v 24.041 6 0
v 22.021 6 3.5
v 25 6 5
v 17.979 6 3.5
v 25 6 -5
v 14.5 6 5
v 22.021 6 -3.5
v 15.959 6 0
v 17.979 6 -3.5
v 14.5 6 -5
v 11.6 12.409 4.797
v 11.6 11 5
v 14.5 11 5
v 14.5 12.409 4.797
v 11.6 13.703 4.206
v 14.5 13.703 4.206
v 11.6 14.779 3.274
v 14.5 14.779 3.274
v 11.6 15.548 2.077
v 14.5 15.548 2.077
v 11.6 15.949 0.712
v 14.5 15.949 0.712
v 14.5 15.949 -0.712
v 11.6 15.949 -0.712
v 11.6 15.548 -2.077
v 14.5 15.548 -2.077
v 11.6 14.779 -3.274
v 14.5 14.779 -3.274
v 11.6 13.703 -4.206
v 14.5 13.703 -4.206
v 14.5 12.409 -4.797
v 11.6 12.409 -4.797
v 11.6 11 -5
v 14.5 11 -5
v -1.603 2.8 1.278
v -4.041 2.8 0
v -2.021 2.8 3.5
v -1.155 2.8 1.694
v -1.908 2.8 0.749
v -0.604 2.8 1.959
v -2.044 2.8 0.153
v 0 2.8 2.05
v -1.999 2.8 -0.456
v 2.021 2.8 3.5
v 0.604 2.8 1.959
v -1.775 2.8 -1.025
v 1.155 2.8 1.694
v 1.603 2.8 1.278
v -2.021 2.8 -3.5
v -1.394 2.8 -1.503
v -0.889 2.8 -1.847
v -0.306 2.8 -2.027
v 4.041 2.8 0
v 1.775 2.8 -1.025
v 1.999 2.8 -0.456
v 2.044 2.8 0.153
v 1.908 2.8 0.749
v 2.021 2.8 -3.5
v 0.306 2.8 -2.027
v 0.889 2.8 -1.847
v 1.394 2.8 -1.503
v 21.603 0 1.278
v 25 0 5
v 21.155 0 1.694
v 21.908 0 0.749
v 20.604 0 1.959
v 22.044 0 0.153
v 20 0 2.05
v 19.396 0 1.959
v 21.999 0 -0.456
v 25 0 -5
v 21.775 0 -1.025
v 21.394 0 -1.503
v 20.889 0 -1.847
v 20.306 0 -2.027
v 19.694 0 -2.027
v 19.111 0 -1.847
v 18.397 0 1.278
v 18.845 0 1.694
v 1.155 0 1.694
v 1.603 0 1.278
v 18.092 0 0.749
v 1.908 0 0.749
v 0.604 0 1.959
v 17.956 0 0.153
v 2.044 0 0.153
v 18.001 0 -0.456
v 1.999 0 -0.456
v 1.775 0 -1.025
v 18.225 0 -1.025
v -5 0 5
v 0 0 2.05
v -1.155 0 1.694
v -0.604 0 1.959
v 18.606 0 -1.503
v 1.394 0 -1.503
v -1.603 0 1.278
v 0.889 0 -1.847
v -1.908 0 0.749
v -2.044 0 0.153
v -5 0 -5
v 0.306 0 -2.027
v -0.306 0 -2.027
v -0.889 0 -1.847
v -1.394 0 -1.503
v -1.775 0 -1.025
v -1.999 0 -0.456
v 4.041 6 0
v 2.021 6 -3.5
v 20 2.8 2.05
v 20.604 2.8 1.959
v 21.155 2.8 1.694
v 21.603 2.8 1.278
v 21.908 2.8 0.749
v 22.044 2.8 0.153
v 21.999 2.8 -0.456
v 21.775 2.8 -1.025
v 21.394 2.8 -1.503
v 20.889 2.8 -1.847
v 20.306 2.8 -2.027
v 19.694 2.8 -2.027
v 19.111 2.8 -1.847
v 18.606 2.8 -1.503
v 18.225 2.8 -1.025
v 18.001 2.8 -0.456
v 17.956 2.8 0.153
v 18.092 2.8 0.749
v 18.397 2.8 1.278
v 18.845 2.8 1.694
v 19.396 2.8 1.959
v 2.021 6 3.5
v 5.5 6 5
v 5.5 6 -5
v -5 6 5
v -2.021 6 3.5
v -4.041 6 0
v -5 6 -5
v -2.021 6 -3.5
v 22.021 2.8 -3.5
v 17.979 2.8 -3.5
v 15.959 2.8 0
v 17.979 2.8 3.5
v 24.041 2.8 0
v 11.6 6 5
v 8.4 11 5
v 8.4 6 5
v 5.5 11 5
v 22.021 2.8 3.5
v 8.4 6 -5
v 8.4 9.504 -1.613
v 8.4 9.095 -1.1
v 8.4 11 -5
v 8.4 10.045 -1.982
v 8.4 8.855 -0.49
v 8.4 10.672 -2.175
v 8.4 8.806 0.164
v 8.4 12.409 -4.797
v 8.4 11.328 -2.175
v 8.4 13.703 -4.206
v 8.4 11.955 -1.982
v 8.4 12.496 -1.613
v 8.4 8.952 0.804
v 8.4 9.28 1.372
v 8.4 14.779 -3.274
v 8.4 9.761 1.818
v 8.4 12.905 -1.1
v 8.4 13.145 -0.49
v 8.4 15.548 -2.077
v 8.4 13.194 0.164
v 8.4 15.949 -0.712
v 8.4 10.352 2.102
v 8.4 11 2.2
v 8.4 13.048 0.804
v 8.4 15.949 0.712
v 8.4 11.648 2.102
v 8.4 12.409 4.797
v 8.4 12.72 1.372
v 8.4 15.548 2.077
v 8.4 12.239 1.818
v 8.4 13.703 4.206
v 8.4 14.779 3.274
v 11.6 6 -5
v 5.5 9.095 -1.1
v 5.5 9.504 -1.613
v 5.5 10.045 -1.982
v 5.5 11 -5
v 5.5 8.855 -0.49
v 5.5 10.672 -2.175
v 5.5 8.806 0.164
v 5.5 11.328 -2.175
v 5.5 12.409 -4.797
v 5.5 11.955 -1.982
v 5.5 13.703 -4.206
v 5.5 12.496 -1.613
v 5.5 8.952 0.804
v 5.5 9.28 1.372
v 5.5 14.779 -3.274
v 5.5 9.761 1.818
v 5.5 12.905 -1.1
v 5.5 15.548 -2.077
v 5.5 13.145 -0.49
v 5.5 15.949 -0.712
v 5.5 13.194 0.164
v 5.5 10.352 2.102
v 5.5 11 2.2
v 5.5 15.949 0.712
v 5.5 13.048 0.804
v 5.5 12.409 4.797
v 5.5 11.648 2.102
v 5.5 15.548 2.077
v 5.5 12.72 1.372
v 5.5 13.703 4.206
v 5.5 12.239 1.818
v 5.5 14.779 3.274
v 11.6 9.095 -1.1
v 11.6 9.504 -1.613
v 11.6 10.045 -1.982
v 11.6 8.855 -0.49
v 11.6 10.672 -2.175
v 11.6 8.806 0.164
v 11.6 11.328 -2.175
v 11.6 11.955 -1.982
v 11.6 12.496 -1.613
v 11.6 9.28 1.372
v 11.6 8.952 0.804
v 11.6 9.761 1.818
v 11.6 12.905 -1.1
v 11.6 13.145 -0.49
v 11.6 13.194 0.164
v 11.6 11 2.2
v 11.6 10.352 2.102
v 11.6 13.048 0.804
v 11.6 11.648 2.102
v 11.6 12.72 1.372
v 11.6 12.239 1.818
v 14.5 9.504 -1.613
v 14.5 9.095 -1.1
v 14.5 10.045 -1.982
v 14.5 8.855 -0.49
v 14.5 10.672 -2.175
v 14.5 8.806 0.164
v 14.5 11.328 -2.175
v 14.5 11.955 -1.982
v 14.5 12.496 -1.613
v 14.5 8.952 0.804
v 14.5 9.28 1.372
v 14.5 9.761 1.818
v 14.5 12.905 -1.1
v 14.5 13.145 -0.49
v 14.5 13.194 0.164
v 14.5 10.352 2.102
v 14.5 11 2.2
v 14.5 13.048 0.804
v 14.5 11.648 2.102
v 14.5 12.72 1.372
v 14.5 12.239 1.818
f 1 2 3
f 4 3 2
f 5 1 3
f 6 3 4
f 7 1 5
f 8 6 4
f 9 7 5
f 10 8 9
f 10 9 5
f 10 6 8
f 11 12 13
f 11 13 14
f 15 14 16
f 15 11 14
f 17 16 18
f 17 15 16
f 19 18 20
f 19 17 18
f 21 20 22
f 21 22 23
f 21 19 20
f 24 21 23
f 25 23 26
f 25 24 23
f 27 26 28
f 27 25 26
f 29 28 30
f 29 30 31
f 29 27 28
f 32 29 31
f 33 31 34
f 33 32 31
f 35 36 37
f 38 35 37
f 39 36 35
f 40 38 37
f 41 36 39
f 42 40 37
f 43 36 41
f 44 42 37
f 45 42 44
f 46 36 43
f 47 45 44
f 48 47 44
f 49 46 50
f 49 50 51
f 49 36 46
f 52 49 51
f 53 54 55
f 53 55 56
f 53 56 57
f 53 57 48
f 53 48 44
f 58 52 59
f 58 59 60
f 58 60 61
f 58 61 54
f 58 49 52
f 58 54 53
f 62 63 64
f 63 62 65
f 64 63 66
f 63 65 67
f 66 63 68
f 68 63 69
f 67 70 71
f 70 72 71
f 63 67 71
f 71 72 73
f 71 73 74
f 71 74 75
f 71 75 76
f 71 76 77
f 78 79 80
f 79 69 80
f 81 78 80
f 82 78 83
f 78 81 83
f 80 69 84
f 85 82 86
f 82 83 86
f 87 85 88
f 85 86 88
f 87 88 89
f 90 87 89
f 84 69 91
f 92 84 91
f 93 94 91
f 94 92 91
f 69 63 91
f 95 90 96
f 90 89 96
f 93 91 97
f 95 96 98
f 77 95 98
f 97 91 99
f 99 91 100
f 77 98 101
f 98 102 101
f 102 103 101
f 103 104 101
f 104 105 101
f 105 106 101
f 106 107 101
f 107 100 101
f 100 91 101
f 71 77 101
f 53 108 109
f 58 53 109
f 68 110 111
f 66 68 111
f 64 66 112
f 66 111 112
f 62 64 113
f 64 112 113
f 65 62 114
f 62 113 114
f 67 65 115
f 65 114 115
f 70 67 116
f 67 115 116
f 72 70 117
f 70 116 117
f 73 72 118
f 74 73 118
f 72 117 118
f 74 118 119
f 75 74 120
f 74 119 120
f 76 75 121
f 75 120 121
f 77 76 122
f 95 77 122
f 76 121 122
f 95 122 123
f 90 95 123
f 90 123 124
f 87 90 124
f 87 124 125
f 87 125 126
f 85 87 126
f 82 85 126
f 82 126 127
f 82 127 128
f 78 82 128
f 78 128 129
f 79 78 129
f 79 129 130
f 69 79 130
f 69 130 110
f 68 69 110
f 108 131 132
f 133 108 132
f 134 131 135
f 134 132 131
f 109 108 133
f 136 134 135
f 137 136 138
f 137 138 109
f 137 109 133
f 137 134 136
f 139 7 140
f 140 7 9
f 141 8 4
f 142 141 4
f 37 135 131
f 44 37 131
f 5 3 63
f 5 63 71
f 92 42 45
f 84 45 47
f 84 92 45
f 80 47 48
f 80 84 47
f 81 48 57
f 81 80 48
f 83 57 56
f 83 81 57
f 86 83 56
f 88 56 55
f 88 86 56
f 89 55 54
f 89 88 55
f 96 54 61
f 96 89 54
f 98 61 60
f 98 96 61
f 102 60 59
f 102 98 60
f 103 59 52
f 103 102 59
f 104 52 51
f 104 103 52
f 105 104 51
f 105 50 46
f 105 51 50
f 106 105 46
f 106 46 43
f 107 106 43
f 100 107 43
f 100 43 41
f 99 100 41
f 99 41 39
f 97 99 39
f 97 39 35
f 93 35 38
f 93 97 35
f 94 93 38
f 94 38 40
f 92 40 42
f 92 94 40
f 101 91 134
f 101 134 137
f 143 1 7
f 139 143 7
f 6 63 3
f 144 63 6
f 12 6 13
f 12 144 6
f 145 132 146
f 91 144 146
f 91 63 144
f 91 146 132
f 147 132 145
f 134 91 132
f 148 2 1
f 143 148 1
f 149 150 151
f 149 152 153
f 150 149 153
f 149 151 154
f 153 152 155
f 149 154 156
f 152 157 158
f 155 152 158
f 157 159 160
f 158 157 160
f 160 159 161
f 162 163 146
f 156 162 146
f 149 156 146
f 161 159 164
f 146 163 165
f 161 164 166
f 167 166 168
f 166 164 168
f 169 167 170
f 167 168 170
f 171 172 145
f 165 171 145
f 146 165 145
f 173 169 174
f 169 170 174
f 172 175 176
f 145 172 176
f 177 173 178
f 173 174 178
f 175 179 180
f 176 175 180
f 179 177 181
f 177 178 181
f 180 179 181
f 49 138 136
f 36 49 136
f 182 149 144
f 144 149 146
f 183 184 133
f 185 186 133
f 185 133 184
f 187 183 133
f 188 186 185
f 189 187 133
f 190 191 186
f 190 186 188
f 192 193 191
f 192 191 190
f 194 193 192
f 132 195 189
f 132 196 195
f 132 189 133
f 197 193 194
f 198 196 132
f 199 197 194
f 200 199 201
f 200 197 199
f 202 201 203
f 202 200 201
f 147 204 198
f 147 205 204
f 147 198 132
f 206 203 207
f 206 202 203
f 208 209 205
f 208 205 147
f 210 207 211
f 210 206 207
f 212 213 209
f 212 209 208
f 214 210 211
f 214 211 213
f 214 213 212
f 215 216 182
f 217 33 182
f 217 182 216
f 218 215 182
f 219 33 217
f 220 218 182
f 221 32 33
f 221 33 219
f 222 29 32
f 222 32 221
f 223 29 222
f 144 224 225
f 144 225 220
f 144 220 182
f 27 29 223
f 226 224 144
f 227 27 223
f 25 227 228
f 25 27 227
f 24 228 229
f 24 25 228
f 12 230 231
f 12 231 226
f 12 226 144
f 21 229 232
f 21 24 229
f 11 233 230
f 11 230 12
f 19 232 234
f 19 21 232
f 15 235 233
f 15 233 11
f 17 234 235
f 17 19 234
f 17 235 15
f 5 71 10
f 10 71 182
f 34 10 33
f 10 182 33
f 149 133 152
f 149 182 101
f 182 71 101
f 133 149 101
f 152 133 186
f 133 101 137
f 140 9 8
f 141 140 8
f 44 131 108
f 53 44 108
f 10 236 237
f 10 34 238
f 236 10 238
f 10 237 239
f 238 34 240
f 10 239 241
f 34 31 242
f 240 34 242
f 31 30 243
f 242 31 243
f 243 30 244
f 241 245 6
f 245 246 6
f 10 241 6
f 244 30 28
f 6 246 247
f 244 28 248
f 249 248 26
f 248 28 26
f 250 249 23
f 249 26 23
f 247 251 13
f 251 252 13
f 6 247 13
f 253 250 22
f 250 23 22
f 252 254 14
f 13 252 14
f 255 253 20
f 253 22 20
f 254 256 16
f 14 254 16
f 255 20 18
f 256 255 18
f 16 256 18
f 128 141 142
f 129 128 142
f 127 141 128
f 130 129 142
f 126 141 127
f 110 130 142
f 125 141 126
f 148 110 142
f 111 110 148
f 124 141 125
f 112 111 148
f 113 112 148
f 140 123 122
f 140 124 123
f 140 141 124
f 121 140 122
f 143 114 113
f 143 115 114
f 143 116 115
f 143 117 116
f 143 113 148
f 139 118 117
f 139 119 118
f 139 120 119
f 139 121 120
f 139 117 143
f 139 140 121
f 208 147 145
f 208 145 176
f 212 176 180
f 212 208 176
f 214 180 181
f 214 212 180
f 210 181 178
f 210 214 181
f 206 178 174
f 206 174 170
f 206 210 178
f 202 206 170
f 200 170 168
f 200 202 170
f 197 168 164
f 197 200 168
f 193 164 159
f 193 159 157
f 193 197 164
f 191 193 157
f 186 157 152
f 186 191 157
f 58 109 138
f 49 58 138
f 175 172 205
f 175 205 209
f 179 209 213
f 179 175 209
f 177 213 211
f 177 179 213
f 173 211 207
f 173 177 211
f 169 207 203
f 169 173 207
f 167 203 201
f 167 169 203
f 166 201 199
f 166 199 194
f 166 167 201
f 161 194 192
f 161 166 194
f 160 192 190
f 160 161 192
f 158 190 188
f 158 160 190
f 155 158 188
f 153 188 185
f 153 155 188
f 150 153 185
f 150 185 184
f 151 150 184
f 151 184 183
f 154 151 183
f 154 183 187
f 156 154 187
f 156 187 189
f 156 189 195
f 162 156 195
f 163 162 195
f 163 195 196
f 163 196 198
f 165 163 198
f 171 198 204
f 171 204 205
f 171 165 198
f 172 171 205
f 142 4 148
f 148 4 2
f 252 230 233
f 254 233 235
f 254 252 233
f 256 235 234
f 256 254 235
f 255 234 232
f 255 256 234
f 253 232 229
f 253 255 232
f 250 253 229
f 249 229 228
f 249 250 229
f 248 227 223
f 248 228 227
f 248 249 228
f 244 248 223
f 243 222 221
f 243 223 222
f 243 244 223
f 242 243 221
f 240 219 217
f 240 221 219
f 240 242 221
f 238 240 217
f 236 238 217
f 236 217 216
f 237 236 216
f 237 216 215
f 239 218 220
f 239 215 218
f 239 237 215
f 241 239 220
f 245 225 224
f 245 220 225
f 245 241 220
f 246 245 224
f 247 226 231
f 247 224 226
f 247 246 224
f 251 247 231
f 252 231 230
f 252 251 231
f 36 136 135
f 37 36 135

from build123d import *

# Parameters (mm, degrees)
SKETCH1_W           = 10
SKETCH1_H           = 10
SKETCH1_R           = 2.05
BOSS_EXTRUDE1_DEPTH = 6
CUT_EXTRUDE1_DEPTH  = 3.2
SKETCH3_W           = 10
SKETCH3_H           = 6
BOSS_EXTRUDE2_DEPTH = 20
SKETCH4_R           = 2.05
CUT_EXTRUDE2_DEPTH  = 27.191601707
CUT_EXTRUDE3_DEPTH  = 3.2
SKETCH6_R           = 2.2
BOSS_EXTRUDE3_DEPTH = 4.5
SKETCH7_W           = 10
SKETCH7_H           = 10.114722763
CUT_EXTRUDE4_DEPTH  = 1.6


with BuildPart() as part:
    # Sketch1 → Boss-Extrude1 (new body)
    with BuildSketch(Plane(origin=(0, 0, 0), x_dir=(1, 0, 0), z_dir=(0, 1, 0))):
        Rectangle(SKETCH1_W, SKETCH1_H)
        with Locations(Location((0, 0, 0), (0, 0, 270))):
            Circle(SKETCH1_R, mode=Mode.SUBTRACT)
    extrude(amount=BOSS_EXTRUDE1_DEPTH)

    # Sketch2 → Cut-Extrude1 (cut)
    with BuildSketch(Plane(origin=(0, 6, 0), x_dir=(1, 0, 0), z_dir=(0, 1, 0))):
        Polygon((4.041451884, 0), (2.020725942, 3.5), (-2.020725942, 3.5), (-4.041451884, 0), (-2.020725942, -3.5), (2.020725942, -3.5), align=None)
    extrude(amount=-CUT_EXTRUDE1_DEPTH, mode=Mode.SUBTRACT)

    # Sketch3 → Boss-Extrude2 (add)
    with BuildSketch(Plane(origin=(5, 0, 0), x_dir=(0, 0, -1), z_dir=(1, 0, 0))):
        with Locations((0, 3)):
            Rectangle(SKETCH3_W, SKETCH3_H)
    extrude(amount=BOSS_EXTRUDE2_DEPTH)

    # Sketch4 → Cut-Extrude2 (cut, through all)
    with BuildSketch(Plane(origin=(0, 6, 0), x_dir=(1, 0, 0), z_dir=(0, 1, 0))):
        with Locations(Location((20, 0, 0), (0, 0, 270))):
            Circle(SKETCH4_R)
    extrude(amount=-CUT_EXTRUDE2_DEPTH, mode=Mode.SUBTRACT)

    # Sketch5 → Cut-Extrude3 (cut)
    with BuildSketch(Plane(origin=(0, 6, 0), x_dir=(1, 0, 0), z_dir=(0, 1, 0))):
        Polygon((24.041451884, 0), (22.020725942, 3.5), (17.979274058, 3.5), (15.958548116, 0), (17.979274058, -3.5), (22.020725942, -3.5), align=None)
    extrude(amount=-CUT_EXTRUDE3_DEPTH, mode=Mode.SUBTRACT)

    # Sketch6 → Boss-Extrude3 (add, symmetric)
    with BuildSketch(Plane.ZY.offset(-10)):
        with BuildLine():
            Line((5, 6), (5, 11))
            ThreePointArc((5, 11), (0, 16), (-5, 11))
            Line((-5, 11), (-5, 6))
            Line((-5, 6), (5, 6))
        make_face()
        with Locations((0, 11)):
            Circle(SKETCH6_R, mode=Mode.SUBTRACT)
    extrude(amount=BOSS_EXTRUDE3_DEPTH, both=True)

    # Sketch7 → Cut-Extrude4 (cut, symmetric)
    with BuildSketch(Plane.ZY.offset(-10)):
        with Locations((0, 11.057361381)):
            Rectangle(SKETCH7_W, SKETCH7_H)
    extrude(amount=CUT_EXTRUDE4_DEPTH, both=True, mode=Mode.SUBTRACT)


solid = part.part
